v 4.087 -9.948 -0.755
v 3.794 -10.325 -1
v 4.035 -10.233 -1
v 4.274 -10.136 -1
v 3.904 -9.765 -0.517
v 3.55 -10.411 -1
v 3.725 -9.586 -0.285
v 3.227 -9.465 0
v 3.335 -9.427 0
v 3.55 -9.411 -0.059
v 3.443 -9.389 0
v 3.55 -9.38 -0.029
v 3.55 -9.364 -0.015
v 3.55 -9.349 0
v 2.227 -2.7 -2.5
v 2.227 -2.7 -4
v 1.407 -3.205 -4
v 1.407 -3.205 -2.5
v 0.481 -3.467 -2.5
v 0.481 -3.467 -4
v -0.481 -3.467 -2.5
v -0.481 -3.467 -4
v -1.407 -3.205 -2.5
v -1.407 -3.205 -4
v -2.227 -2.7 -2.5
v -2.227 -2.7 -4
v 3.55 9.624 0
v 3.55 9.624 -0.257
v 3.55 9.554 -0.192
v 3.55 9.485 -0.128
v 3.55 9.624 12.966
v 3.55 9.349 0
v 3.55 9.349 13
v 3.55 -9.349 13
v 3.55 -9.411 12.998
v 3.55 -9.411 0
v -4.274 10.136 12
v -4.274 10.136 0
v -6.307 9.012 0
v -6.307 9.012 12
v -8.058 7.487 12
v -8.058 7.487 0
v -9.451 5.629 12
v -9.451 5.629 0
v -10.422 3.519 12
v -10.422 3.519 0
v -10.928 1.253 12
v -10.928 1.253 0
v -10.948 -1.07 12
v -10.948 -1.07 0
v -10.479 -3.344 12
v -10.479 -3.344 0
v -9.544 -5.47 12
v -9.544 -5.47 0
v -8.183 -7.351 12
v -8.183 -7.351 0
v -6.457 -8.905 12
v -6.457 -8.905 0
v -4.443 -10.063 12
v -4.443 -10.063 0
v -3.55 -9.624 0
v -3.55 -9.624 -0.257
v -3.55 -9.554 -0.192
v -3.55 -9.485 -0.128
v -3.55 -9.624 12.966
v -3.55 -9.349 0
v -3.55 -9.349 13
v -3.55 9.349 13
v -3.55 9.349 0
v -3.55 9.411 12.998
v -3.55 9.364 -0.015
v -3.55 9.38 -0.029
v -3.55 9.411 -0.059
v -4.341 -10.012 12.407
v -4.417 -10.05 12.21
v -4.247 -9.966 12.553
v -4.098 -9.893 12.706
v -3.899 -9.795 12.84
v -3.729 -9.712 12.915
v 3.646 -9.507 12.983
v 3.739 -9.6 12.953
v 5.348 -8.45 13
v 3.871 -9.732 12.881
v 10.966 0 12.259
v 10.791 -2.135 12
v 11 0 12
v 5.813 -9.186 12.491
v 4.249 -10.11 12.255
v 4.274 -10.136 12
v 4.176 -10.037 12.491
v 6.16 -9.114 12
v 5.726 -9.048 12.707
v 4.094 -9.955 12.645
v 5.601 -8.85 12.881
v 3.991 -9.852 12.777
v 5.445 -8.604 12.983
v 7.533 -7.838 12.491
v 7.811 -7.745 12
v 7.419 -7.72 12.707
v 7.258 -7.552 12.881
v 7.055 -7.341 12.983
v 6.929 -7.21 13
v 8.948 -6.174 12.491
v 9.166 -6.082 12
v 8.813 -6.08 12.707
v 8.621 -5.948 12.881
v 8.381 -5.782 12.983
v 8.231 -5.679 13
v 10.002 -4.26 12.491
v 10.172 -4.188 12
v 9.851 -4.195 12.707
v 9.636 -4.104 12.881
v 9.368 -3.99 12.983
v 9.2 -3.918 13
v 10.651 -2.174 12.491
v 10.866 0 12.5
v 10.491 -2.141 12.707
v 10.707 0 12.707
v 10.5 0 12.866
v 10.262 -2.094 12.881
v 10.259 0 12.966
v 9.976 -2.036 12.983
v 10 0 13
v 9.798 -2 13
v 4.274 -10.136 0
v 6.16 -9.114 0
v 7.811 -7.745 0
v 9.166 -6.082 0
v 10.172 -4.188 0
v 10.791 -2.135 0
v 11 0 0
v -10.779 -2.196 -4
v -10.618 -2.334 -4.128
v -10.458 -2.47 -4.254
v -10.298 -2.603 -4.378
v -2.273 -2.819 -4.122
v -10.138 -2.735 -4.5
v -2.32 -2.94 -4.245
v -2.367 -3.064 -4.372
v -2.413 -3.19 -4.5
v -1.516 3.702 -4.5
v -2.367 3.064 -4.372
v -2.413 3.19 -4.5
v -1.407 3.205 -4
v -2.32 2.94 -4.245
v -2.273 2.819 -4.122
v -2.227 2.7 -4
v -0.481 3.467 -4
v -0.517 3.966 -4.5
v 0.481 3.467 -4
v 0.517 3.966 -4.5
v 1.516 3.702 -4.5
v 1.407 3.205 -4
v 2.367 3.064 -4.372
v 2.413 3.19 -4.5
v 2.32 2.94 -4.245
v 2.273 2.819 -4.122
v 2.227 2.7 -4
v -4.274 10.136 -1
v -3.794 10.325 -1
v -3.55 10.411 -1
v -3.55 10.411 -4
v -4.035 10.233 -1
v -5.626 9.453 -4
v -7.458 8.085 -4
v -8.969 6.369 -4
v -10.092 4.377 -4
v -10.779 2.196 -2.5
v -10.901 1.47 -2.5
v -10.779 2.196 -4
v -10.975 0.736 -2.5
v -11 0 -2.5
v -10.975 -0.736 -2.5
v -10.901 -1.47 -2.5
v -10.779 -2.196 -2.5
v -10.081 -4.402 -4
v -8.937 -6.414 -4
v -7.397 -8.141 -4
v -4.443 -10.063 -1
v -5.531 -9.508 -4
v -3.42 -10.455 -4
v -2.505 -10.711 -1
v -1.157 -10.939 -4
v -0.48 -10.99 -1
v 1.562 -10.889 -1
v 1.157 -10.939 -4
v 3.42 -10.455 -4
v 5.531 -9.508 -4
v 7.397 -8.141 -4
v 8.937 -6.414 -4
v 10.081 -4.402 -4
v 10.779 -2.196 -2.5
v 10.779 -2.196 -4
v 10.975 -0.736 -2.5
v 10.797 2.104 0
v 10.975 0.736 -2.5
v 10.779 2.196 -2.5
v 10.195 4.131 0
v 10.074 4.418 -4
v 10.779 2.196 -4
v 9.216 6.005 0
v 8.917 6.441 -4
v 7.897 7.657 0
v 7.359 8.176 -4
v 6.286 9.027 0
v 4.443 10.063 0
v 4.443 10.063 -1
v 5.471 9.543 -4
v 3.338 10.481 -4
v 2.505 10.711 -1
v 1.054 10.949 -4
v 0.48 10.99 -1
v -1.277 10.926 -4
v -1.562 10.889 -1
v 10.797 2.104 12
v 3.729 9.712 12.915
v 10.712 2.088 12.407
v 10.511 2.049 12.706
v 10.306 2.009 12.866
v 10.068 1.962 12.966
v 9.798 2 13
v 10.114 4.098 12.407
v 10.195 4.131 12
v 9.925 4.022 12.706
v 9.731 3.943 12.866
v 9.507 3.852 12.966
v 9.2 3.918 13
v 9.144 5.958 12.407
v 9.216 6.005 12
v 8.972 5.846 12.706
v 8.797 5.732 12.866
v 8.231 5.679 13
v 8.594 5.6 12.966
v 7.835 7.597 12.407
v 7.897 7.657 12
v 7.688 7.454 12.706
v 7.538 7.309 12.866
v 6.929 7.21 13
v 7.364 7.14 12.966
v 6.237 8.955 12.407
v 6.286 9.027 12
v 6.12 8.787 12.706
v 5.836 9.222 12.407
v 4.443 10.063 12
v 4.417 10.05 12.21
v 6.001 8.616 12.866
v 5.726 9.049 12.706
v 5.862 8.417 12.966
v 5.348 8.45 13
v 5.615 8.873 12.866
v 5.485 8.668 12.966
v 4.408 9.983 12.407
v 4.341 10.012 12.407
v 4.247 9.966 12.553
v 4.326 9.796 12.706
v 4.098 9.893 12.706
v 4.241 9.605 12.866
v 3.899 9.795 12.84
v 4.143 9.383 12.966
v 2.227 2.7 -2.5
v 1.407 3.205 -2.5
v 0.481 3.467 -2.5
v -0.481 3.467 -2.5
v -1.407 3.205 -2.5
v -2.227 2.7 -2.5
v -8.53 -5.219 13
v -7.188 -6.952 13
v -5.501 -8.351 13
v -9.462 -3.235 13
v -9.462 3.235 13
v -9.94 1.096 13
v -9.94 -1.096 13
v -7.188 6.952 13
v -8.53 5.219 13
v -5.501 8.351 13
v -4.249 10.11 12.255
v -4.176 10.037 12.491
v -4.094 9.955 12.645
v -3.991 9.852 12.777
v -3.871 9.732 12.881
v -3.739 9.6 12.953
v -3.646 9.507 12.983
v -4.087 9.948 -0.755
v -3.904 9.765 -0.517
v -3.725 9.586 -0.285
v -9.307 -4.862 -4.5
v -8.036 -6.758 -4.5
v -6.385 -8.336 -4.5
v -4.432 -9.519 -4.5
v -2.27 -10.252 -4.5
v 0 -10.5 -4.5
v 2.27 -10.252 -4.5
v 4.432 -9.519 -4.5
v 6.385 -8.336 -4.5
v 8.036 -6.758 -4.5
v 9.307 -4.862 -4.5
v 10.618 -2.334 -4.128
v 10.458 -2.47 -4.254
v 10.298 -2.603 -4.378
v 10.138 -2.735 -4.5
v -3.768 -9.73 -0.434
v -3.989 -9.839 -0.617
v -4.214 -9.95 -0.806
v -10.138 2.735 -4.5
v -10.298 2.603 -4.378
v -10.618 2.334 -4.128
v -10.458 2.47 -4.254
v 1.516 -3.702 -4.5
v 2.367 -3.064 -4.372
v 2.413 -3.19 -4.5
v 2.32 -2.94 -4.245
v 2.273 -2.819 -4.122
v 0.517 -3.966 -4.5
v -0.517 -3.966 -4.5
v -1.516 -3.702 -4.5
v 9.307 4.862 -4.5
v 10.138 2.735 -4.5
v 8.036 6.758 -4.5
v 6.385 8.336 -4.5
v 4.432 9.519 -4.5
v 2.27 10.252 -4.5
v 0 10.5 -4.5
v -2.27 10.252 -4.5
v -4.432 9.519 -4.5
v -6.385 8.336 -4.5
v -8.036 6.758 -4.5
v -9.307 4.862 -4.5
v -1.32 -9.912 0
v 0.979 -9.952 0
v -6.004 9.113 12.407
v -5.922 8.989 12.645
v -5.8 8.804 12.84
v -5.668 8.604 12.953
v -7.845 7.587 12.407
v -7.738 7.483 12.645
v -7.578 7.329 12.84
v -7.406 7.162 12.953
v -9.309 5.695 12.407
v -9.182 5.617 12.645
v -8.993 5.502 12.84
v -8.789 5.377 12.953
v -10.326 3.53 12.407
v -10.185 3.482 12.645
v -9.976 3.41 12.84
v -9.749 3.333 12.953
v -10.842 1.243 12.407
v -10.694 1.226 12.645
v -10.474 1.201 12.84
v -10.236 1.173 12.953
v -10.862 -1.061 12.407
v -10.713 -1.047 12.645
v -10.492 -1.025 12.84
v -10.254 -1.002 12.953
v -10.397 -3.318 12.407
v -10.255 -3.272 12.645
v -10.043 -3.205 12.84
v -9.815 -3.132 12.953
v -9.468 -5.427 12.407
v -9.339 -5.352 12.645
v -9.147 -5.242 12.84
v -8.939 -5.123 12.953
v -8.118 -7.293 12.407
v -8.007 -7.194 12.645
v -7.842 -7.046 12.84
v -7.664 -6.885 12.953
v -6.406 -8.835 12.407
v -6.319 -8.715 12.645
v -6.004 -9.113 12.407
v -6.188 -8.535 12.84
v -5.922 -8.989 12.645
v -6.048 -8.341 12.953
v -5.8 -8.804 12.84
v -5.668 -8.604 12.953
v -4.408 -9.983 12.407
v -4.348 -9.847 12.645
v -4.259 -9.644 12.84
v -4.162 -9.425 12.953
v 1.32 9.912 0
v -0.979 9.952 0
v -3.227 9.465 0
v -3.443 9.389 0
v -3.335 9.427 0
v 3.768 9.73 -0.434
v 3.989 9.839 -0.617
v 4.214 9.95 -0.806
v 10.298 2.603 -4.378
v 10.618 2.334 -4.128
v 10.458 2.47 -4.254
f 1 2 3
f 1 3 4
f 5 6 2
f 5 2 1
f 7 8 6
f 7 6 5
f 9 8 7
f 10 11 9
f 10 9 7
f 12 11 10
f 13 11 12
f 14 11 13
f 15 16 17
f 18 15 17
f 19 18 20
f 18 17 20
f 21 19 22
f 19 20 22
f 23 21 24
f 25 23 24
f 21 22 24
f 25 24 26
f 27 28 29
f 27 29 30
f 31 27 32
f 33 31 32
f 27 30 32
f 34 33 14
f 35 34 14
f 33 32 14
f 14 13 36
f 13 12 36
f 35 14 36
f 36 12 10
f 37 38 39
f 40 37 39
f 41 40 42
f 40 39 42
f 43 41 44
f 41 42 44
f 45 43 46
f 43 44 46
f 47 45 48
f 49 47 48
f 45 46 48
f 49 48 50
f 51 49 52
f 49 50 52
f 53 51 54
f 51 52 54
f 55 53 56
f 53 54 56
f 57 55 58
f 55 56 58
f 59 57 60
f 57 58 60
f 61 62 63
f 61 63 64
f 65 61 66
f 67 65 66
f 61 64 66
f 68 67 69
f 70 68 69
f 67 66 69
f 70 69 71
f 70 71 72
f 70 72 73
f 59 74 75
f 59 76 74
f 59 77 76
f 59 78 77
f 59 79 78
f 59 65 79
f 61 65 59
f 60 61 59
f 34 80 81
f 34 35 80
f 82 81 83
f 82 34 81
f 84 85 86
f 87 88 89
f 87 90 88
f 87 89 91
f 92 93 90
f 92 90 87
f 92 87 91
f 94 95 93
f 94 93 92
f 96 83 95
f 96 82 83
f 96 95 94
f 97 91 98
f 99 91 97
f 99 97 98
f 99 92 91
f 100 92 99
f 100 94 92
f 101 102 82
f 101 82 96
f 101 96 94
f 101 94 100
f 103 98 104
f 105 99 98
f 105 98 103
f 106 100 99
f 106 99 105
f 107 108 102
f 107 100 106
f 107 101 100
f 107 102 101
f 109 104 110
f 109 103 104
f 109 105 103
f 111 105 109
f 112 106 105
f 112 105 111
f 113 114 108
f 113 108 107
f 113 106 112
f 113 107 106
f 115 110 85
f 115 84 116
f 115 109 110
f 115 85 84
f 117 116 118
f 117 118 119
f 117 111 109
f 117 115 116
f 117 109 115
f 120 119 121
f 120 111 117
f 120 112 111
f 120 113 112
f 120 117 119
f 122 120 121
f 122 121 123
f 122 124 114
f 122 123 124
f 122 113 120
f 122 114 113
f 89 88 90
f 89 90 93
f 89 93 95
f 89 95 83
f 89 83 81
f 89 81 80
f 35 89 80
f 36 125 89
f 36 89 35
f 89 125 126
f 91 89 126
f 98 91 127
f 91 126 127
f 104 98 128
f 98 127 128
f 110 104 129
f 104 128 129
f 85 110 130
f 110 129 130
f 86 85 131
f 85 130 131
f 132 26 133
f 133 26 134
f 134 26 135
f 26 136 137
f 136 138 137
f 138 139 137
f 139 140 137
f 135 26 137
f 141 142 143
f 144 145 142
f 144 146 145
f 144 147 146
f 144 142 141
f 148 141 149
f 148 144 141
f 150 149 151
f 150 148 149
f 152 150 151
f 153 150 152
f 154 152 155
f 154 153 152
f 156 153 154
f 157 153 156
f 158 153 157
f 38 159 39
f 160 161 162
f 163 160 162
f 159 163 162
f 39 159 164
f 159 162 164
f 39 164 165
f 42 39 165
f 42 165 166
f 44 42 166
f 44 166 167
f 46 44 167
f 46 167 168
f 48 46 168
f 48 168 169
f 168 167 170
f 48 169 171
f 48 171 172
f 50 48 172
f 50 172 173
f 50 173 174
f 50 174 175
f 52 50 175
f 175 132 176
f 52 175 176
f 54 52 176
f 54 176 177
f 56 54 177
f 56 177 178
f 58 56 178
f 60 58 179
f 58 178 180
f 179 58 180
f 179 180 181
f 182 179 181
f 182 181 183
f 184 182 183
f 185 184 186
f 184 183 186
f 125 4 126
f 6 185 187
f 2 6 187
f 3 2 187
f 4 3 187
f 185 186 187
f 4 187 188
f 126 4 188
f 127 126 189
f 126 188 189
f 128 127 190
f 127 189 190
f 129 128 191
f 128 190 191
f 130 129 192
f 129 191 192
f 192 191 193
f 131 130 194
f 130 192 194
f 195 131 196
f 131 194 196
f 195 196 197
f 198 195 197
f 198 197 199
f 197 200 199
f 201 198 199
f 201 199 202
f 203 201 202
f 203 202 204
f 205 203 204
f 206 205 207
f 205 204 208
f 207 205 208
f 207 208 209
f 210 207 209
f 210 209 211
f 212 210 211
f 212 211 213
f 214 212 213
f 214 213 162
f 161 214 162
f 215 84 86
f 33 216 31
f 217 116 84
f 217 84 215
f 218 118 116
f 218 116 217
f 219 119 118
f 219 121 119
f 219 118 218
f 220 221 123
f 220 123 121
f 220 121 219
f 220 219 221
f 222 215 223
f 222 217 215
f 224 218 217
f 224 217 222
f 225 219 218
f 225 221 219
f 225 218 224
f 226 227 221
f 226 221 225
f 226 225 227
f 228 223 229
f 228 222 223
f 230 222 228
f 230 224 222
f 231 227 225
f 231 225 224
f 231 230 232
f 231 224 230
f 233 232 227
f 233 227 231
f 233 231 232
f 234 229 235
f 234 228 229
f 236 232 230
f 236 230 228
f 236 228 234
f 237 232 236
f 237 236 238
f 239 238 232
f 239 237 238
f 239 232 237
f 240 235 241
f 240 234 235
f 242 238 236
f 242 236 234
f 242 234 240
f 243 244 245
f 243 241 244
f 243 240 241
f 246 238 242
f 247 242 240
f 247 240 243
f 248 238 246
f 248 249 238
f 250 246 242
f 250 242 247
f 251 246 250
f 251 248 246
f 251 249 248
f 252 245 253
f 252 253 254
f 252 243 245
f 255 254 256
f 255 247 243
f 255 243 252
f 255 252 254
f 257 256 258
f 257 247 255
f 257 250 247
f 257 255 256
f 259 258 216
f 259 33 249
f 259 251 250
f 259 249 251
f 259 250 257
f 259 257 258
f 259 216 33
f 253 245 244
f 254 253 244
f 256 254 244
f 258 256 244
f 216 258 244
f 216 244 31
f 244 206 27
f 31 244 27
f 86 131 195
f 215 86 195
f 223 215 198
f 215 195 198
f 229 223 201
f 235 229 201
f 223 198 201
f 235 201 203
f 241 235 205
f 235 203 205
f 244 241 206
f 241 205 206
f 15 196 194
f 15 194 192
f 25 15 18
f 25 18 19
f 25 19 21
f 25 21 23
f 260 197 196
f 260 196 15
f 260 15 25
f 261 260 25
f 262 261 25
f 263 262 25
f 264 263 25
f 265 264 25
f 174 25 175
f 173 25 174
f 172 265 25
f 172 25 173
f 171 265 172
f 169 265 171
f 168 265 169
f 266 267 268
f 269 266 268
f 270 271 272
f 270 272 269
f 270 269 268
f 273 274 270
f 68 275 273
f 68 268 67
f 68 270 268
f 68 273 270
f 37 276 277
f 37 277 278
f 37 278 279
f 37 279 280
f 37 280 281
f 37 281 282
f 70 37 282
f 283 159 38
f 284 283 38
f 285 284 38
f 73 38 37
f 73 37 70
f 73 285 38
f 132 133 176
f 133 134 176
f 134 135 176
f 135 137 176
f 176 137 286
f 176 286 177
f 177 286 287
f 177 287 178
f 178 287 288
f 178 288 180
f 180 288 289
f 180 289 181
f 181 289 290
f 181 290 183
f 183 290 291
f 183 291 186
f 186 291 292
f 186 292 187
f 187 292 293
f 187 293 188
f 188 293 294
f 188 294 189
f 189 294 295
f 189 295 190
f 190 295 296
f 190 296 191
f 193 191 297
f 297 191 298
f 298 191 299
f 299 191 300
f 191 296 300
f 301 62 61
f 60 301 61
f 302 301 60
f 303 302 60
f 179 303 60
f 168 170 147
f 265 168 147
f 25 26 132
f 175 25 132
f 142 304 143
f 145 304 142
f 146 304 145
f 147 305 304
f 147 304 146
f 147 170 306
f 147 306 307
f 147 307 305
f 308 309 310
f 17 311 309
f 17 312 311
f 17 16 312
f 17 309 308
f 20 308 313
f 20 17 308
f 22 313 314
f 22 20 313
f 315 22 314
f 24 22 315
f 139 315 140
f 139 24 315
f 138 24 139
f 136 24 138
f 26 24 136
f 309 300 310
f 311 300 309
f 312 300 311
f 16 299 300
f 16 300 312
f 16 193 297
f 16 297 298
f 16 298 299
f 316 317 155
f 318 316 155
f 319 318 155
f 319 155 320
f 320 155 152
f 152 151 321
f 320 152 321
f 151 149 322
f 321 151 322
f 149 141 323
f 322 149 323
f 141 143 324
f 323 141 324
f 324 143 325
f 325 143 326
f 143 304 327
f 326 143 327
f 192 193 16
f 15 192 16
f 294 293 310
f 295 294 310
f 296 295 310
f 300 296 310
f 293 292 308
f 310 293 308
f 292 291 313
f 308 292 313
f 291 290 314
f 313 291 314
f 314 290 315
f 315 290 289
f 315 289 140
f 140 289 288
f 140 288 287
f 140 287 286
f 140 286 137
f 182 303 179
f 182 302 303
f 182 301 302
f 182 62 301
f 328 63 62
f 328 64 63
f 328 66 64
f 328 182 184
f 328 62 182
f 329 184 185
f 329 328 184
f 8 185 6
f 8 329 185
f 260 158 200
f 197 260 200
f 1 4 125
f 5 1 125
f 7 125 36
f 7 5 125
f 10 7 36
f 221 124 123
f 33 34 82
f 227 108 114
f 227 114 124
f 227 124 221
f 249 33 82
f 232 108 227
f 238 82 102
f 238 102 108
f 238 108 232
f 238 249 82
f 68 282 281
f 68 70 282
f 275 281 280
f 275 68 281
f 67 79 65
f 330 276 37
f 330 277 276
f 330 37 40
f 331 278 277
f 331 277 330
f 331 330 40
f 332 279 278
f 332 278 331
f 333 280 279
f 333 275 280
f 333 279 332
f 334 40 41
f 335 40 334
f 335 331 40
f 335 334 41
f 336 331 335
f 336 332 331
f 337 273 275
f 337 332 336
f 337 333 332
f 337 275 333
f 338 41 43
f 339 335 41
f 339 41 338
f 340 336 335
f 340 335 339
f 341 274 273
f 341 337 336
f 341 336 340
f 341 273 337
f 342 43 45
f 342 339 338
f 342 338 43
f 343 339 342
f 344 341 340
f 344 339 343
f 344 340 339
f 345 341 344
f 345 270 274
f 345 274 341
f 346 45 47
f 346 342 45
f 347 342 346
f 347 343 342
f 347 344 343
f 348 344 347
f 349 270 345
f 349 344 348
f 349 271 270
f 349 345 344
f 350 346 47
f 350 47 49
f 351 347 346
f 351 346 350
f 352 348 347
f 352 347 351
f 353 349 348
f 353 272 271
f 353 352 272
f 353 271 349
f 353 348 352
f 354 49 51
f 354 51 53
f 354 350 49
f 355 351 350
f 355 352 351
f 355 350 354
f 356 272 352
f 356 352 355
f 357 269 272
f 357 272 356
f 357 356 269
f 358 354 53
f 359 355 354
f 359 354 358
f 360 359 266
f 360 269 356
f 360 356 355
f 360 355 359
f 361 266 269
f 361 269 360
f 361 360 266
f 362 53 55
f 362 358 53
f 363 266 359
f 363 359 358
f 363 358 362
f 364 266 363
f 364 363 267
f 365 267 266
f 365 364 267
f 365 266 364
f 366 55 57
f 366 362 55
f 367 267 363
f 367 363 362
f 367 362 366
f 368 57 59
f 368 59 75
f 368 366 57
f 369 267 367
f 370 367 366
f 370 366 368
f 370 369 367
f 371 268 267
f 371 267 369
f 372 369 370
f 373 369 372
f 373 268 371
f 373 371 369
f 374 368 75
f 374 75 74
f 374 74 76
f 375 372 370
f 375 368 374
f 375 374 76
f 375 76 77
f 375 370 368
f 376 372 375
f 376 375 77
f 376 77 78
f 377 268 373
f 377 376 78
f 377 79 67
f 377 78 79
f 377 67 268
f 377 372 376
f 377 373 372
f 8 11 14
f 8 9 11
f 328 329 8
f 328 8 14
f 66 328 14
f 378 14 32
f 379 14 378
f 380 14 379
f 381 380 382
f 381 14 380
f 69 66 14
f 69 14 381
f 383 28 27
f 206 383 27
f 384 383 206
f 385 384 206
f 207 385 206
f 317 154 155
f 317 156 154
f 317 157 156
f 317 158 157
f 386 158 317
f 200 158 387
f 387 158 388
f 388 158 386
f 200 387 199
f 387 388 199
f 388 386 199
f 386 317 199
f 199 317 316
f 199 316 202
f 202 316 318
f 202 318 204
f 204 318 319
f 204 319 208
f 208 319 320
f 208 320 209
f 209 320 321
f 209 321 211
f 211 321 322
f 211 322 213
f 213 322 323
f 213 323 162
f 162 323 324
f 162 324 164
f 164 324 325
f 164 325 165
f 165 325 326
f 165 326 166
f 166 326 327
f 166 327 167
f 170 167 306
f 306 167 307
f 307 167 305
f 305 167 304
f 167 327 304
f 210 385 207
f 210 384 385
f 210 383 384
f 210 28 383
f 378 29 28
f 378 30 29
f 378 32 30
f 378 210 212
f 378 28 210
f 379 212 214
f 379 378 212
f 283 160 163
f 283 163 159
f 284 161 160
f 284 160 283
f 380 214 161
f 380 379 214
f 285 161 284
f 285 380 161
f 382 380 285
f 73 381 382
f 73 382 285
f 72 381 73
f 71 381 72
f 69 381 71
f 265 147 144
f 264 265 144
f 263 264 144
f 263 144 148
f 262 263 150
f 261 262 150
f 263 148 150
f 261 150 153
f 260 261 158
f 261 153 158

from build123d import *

# Parameters (mm, degrees)
PILL_SLOT_DEPTH           = 13
BASE_START                = -4.5
SKETCH2_5_R               = 11
BASE_DEPTH                = 4.5
SKETCH3_R                 = 3.5
SERVO_ROTATION_SLOT_DEPTH = 2
CHAMFER1_SIZE             = 0.787885924
CHAMFER1_SIZE_2           = 1
FILLET1_R                 = 1
CHAMFER2_SIZE             = 0.5
CHAMFER4_SIZE             = 1


with BuildPart() as part:
    # Sketch2 → Pill Slot (new body)
    with BuildSketch(Plane.XY):
        with BuildLine():
            ThreePointArc((11, 0), (8.945669343, 6.401171768), (3.55, 10.411412008))
            Line((3.55, 10.411412008), (3.55, 0))
            Line((3.55, 0), (11, 0))
        make_face()
        with BuildLine():
            Line((11, 0), (3.55, 0))
            Line((3.55, 0), (3.55, -10.411412008))
            ThreePointArc((3.55, -10.411412008), (8.945669343, -6.401171768), (11, 0))
        make_face()
        with BuildLine():
            Line((-3.55, -10.411412008), (-3.55, 10.411412008))
            ThreePointArc((-3.55, 10.411412008), (-11, 0), (-3.55, -10.411412008))
        make_face()
    extrude(amount=PILL_SLOT_DEPTH)

    # Sketch2<5> → Base (add)
    with BuildSketch(Plane.XY.offset(BASE_START)):
        with Locations(Location((0, 0, 0), (0, 0, 108.827939217))):
            Circle(SKETCH2_5_R)
    extrude(amount=BASE_DEPTH)

    # Sketch3 → Servo Rotation slot (cut)
    with BuildSketch(Plane(origin=(0, 0, -4.5), x_dir=(-1, 0, 0), z_dir=(0, 0, -1))):
        with BuildLine():
            Line((-2.227105745, 2.7), (-10.778529281, 2.196202755))
            ThreePointArc((-10.778529281, 2.196202755), (-11, 0), (-10.778529281, -2.196202755))
            Line((-10.778529281, -2.196202755), (-2.227105745, -2.7))
            ThreePointArc((-2.227105745, -2.7), (-3.5, 0), (-2.227105745, 2.7))
        make_face()
        Circle(SKETCH3_R)
        with BuildLine():
            ThreePointArc((11, 0), (10.94449227, 1.103670673), (10.778529281, 2.196202755))
            Line((10.778529281, 2.196202755), (2.227105745, 2.7))
            ThreePointArc((2.227105745, 2.7), (3.165822966, 1.492502913), (3.5, 0))
            ThreePointArc((3.5, 0), (3.165822966, -1.492502913), (2.227105745, -2.7))
            Line((2.227105745, -2.7), (10.778529281, -2.196202755))
            ThreePointArc((10.778529281, -2.196202755), (10.94449227, -1.103670673), (11, 0))
        make_face()
    extrude(amount=-SERVO_ROTATION_SLOT_DEPTH, mode=Mode.SUBTRACT)

    # Chamfer1
    # the kernel refuses this chamfer: 1, 0.787885924 mm, written as the material it takes off along each edge
    with BuildSketch(Plane(origin=(3.55, 10.411412008, 0), x_dir=(0.9315227050820926, -0.36368317244071224, 0), z_dir=(0, 0, 1))) as chamfer1_piece_1:
        with BuildLine():
            Line((0.959099491, 0), (CHAMFER1_SIZE * 0.363683172432, -CHAMFER1_SIZE * 0.93152270506))
            Line((CHAMFER1_SIZE * 0.363683172432, -CHAMFER1_SIZE * 0.93152270506), (0, 0))
            ThreePointArc((0, 0), (0.493056629, 0.010449768), (0.959099491, 0))
        make_face()
    extrude(amount=15.466411675, mode=Mode.SUBTRACT)
    with BuildSketch(Plane(origin=(3.55, -10.411412008, 0), x_dir=(0.9345365261076723, 0.35586722435566304, 0), z_dir=(0, 0, 1))) as chamfer1_piece_2:
        with BuildLine():
            Line((0.77495125, 0), (CHAMFER1_SIZE_2 * 0.355867224356, CHAMFER1_SIZE_2 * 0.934536526108))
            Line((CHAMFER1_SIZE_2 * 0.355867224356, CHAMFER1_SIZE_2 * 0.934536526108), (0, 0))
            ThreePointArc((0, 0), (0.395650754, -0.006823506), (0.77495125, 0))
        make_face()
    extrude(amount=15.571682988, mode=Mode.SUBTRACT)
    with BuildSketch(Plane(origin=(-3.55, 10.411412008, 0), x_dir=(0, -1, 0), z_dir=(0, 0, 1))) as chamfer1_piece_3:
        with BuildLine():
            Line((CHAMFER1_SIZE_2, 0), (0.275779751, -0.724220249))
            ThreePointArc((0.275779751, -0.724220249), (0.13442232, -0.372178343), (0, 0))
            Line((0, 0), (CHAMFER1_SIZE_2, 0))
        make_face()
    extrude(amount=15.571682988, mode=Mode.SUBTRACT)
    with BuildSketch(Plane(origin=(-3.55, -10.411412008, 0), x_dir=(0, 1, 0), z_dir=(0, 0, 1))) as chamfer1_piece_4:
        with BuildLine():
            Line((CHAMFER1_SIZE, 0), (0.348808346, 0.893422953))
            ThreePointArc((0.348808346, 0.893422953), (0.169582203, 0.463093849), (0, 0))
            Line((0, 0), (CHAMFER1_SIZE, 0))
        make_face()
    extrude(amount=15.466411675, mode=Mode.SUBTRACT)

    # Fillet1
    fillet1_edges = [part.edges().sort_by_distance(p)[0] for p in [
        (-10.999614053, 0.0921449, 13),
        (10.999614053, -0.0921449, 13),
    ]]
    fillet(fillet1_edges, radius=FILLET1_R)

    # Chamfer2
    chamfer2_edges = [part.edges().sort_by_distance(p)[0] for p in [
        (5.471318366, 9.542781321, -4.5),
        (0, -11, -4.5),
        (6.502817513, 2.448101378, -4.5),
        (-6.502817513, -2.448101378, -4.5),
        (6.502817513, -2.448101378, -4.5),
        (0, -3.5, -4.5),
        (-6.502817513, 2.448101378, -4.5),
        (0, 3.5, -4.5),
    ]]
    chamfer(chamfer2_edges, length=CHAMFER2_SIZE)

    # Chamfer4
    # the kernel refuses this chamfer: 1 mm, written as the material it takes off along each edge
    with BuildSketch(Plane(origin=(0, 0, 0), x_dir=(0.6048985718771838, 0.79630252903086, 0), z_dir=(0.79630252903086, -0.6048985718771838, 0))) as chamfer4_piece_1_section:
        Polygon((11, -CHAMFER4_SIZE), (11 - CHAMFER4_SIZE, 0), (11, 0), align=None)
    chamfer4_piece_1 = revolve(axis=Axis((0, 0, 0), (0, 0, 1)), revolution_arc=56.049482755, mode=Mode.PRIVATE)
    chamfer4_piece_1 = split(chamfer4_piece_1, bisect_by=Plane(origin=(3.55, 0, 0), z_dir=(-1, 0, 0)), keep=Keep.TOP, mode=Mode.PRIVATE)
    chamfer4_piece_1 = split(chamfer4_piece_1, bisect_by=Plane(origin=(-3.11882364, 6.346096367, 0), z_dir=(0.44106826903235785, -0.8974735550715685, 0)), keep=Keep.TOP, mode=Mode.PRIVATE)
    add(chamfer4_piece_1, mode=Mode.SUBTRACT)
    with BuildSketch(Plane(origin=(0, 0, 0), x_dir=(0.6048985718771838, 0.79630252903086, 0), z_dir=(0.79630252903086, -0.6048985718771838, 0))) as chamfer4_piece_2_section:
        Polygon((11, -CHAMFER4_SIZE), (11 - CHAMFER4_SIZE, 0), (11, 0), align=None)
    chamfer4_piece_2 = revolve(axis=Axis((0, 0, 0), (0, 0, 1)), revolution_arc=56.049482755, mode=Mode.PRIVATE)
    chamfer4_piece_2 = split(chamfer4_piece_2, bisect_by=Plane(origin=(3.55, 0, 0), z_dir=(1, 0, 0)), keep=Keep.TOP, mode=Mode.PRIVATE)
    chamfer4_piece_2 = split(chamfer4_piece_2, bisect_by=Plane(origin=(-3.11882364, 6.346096367, 0), z_dir=(-0.44106826903235785, 0.8974735550715685, 0)), keep=Keep.TOP, mode=Mode.PRIVATE)
    add(chamfer4_piece_2, mode=Mode.SUBTRACT)
    with BuildSketch(Plane(origin=(0, 0, 0), x_dir=(0.6048985718771838, 0.79630252903086, 0), z_dir=(0.79630252903086, -0.6048985718771838, 0))) as chamfer4_piece_3_section:
        Polygon((11, -CHAMFER4_SIZE), (11 - CHAMFER4_SIZE, 0), (11, 0), align=None)
    chamfer4_piece_3 = revolve(axis=Axis((0, 0, 0), (0, 0, 1)), revolution_arc=56.049482755, mode=Mode.PRIVATE)
    chamfer4_piece_3 = split(chamfer4_piece_3, bisect_by=Plane(origin=(3.55, 0, 0), z_dir=(-1, 0, 0)), keep=Keep.TOP, mode=Mode.PRIVATE)
    chamfer4_piece_3 = split(chamfer4_piece_3, bisect_by=Plane(origin=(-3.11882364, 6.346096367, 0), z_dir=(-0.44106826903235785, 0.8974735550715685, 0)), keep=Keep.TOP, mode=Mode.PRIVATE)
    add(chamfer4_piece_3, mode=Mode.SUBTRACT)
    with BuildSketch(Plane(origin=(0, 0, 0), x_dir=(-0.6048985718728862, -0.7963025290341244, 0), z_dir=(-0.7963025290341244, 0.6048985718728862, 0))) as chamfer4_piece_4_section:
        Polygon((11, -CHAMFER4_SIZE), (11 - CHAMFER4_SIZE, 0), (11, 0), align=None)
    chamfer4_piece_4 = revolve(axis=Axis((0, 0, 0), (0, 0, 1)), revolution_arc=56.049482754, mode=Mode.PRIVATE)
    chamfer4_piece_4 = split(chamfer4_piece_4, bisect_by=Plane(origin=(-3.55, 0, 0), z_dir=(1, 0, 0)), keep=Keep.TOP, mode=Mode.PRIVATE)
    chamfer4_piece_4 = split(chamfer4_piece_4, bisect_by=Plane(origin=(3.11882364, -6.346096367, 0), z_dir=(-0.44106826904770263, 0.8974735550640272, 0)), keep=Keep.TOP, mode=Mode.PRIVATE)
    add(chamfer4_piece_4, mode=Mode.SUBTRACT)
    with BuildSketch(Plane(origin=(0, 0, 0), x_dir=(-0.6048985718728862, -0.7963025290341244, 0), z_dir=(-0.7963025290341244, 0.6048985718728862, 0))) as chamfer4_piece_5_section:
        Polygon((11, -CHAMFER4_SIZE), (11 - CHAMFER4_SIZE, 0), (11, 0), align=None)
    chamfer4_piece_5 = revolve(axis=Axis((0, 0, 0), (0, 0, 1)), revolution_arc=56.049482754, mode=Mode.PRIVATE)
    chamfer4_piece_5 = split(chamfer4_piece_5, bisect_by=Plane(origin=(-3.55, 0, 0), z_dir=(-1, 0, 0)), keep=Keep.TOP, mode=Mode.PRIVATE)
    chamfer4_piece_5 = split(chamfer4_piece_5, bisect_by=Plane(origin=(3.11882364, -6.346096367, 0), z_dir=(0.44106826904770263, -0.8974735550640272, 0)), keep=Keep.TOP, mode=Mode.PRIVATE)
    add(chamfer4_piece_5, mode=Mode.SUBTRACT)
    with BuildSketch(Plane(origin=(0, 0, 0), x_dir=(-0.6048985718728862, -0.7963025290341244, 0), z_dir=(-0.7963025290341244, 0.6048985718728862, 0))) as chamfer4_piece_6_section:
        Polygon((11, -CHAMFER4_SIZE), (11 - CHAMFER4_SIZE, 0), (11, 0), align=None)
    chamfer4_piece_6 = revolve(axis=Axis((0, 0, 0), (0, 0, 1)), revolution_arc=56.049482754, mode=Mode.PRIVATE)
    chamfer4_piece_6 = split(chamfer4_piece_6, bisect_by=Plane(origin=(-3.55, 0, 0), z_dir=(1, 0, 0)), keep=Keep.TOP, mode=Mode.PRIVATE)
    chamfer4_piece_6 = split(chamfer4_piece_6, bisect_by=Plane(origin=(3.11882364, -6.346096367, 0), z_dir=(0.44106826904770263, -0.8974735550640272, 0)), keep=Keep.TOP, mode=Mode.PRIVATE)
    add(chamfer4_piece_6, mode=Mode.SUBTRACT)
    with BuildSketch(Plane(origin=(0, -1e-09, 0), x_dir=(0.32272727272524954, -0.9464920007265367, 0), z_dir=(-0.9464920007265367, -0.32272727272524954, 0))) as chamfer4_piece_7_section:
        Polygon((10.999999999, -CHAMFER4_SIZE), (10.999999999 - CHAMFER4_SIZE, 0), (10.999999999, 0), align=None)
    chamfer4_piece_7 = revolve(axis=Axis((0, -1e-09, 0), (0, 0, 1)), revolution_arc=17.432483992, mode=Mode.PRIVATE)
    chamfer4_piece_7 = split(chamfer4_piece_7, bisect_by=Plane(origin=(-2.930706004, -2.930706004, 0), z_dir=(-0.7071067811864781, -0.7071067811866171, 0)), keep=Keep.TOP, mode=Mode.PRIVATE)
    chamfer4_piece_7 = split(chamfer4_piece_7, bisect_by=Plane(origin=(3.55, -1e-09, 0), z_dir=(1, 0, 0)), keep=Keep.TOP, mode=Mode.PRIVATE)
    add(chamfer4_piece_7, mode=Mode.SUBTRACT)
    with BuildSketch(Plane(origin=(0, -1e-09, 0), x_dir=(0.32272727272524954, -0.9464920007265367, 0), z_dir=(-0.9464920007265367, -0.32272727272524954, 0))) as chamfer4_piece_8_section:
        Polygon((10.999999999, -CHAMFER4_SIZE), (10.999999999 - CHAMFER4_SIZE, 0), (10.999999999, 0), align=None)
    chamfer4_piece_8 = revolve(axis=Axis((0, -1e-09, 0), (0, 0, 1)), revolution_arc=17.432483992, mode=Mode.PRIVATE)
    chamfer4_piece_8 = split(chamfer4_piece_8, bisect_by=Plane(origin=(-2.930706004, -2.930706004, 0), z_dir=(-0.7071067811864781, -0.7071067811866171, 0)), keep=Keep.TOP, mode=Mode.PRIVATE)
    chamfer4_piece_8 = split(chamfer4_piece_8, bisect_by=Plane(origin=(3.55, -1e-09, 0), z_dir=(-1, 0, 0)), keep=Keep.TOP, mode=Mode.PRIVATE)
    add(chamfer4_piece_8, mode=Mode.SUBTRACT)
    with BuildSketch(Plane(origin=(0, -1e-09, 0), x_dir=(0.32272727272524954, -0.9464920007265367, 0), z_dir=(-0.9464920007265367, -0.32272727272524954, 0))) as chamfer4_piece_9_section:
        Polygon((10.999999999, -CHAMFER4_SIZE), (10.999999999 - CHAMFER4_SIZE, 0), (10.999999999, 0), align=None)
    chamfer4_piece_9 = revolve(axis=Axis((0, -1e-09, 0), (0, 0, 1)), revolution_arc=17.432483992, mode=Mode.PRIVATE)
    chamfer4_piece_9 = split(chamfer4_piece_9, bisect_by=Plane(origin=(-2.930706004, -2.930706004, 0), z_dir=(0.7071067811864781, 0.7071067811866171, 0)), keep=Keep.TOP, mode=Mode.PRIVATE)
    chamfer4_piece_9 = split(chamfer4_piece_9, bisect_by=Plane(origin=(3.55, -1e-09, 0), z_dir=(-1, 0, 0)), keep=Keep.TOP, mode=Mode.PRIVATE)
    add(chamfer4_piece_9, mode=Mode.SUBTRACT)
    with BuildSketch(Plane(origin=(0, 0, 0), x_dir=(-0.32272727272727286, 0.9464920007258469, 0), z_dir=(0.9464920007258469, 0.32272727272727286, 0))) as chamfer4_piece_10_section:
        Polygon((11, -CHAMFER4_SIZE), (11 - CHAMFER4_SIZE, 0), (11, 0), align=None)
    chamfer4_piece_10 = revolve(axis=Axis((0, 0, 0), (0, 0, 1)), revolution_arc=17.43248399, mode=Mode.PRIVATE)
    chamfer4_piece_10 = split(chamfer4_piece_10, bisect_by=Plane(origin=(2.930706004, 2.930706004, 0), z_dir=(0.7071067811865476, 0.7071067811865476, 0)), keep=Keep.TOP, mode=Mode.PRIVATE)
    chamfer4_piece_10 = split(chamfer4_piece_10, bisect_by=Plane(origin=(-3.55, 0, 0), z_dir=(-1, 0, 0)), keep=Keep.TOP, mode=Mode.PRIVATE)
    add(chamfer4_piece_10, mode=Mode.SUBTRACT)
    with BuildSketch(Plane(origin=(0, 0, 0), x_dir=(-0.32272727272727286, 0.9464920007258469, 0), z_dir=(0.9464920007258469, 0.32272727272727286, 0))) as chamfer4_piece_11_section:
        Polygon((11, -CHAMFER4_SIZE), (11 - CHAMFER4_SIZE, 0), (11, 0), align=None)
    chamfer4_piece_11 = revolve(axis=Axis((0, 0, 0), (0, 0, 1)), revolution_arc=17.43248399, mode=Mode.PRIVATE)
    chamfer4_piece_11 = split(chamfer4_piece_11, bisect_by=Plane(origin=(2.930706004, 2.930706004, 0), z_dir=(0.7071067811865476, 0.7071067811865476, 0)), keep=Keep.TOP, mode=Mode.PRIVATE)
    chamfer4_piece_11 = split(chamfer4_piece_11, bisect_by=Plane(origin=(-3.55, 0, 0), z_dir=(1, 0, 0)), keep=Keep.TOP, mode=Mode.PRIVATE)
    add(chamfer4_piece_11, mode=Mode.SUBTRACT)
    with BuildSketch(Plane(origin=(0, 0, 0), x_dir=(-0.32272727272727286, 0.9464920007258469, 0), z_dir=(0.9464920007258469, 0.32272727272727286, 0))) as chamfer4_piece_12_section:
        Polygon((11, -CHAMFER4_SIZE), (11 - CHAMFER4_SIZE, 0), (11, 0), align=None)
    chamfer4_piece_12 = revolve(axis=Axis((0, 0, 0), (0, 0, 1)), revolution_arc=17.43248399, mode=Mode.PRIVATE)
    chamfer4_piece_12 = split(chamfer4_piece_12, bisect_by=Plane(origin=(2.930706004, 2.930706004, 0), z_dir=(-0.7071067811865476, -0.7071067811865476, 0)), keep=Keep.TOP, mode=Mode.PRIVATE)
    chamfer4_piece_12 = split(chamfer4_piece_12, bisect_by=Plane(origin=(-3.55, 0, 0), z_dir=(1, 0, 0)), keep=Keep.TOP, mode=Mode.PRIVATE)
    add(chamfer4_piece_12, mode=Mode.SUBTRACT)


solid = part.part
